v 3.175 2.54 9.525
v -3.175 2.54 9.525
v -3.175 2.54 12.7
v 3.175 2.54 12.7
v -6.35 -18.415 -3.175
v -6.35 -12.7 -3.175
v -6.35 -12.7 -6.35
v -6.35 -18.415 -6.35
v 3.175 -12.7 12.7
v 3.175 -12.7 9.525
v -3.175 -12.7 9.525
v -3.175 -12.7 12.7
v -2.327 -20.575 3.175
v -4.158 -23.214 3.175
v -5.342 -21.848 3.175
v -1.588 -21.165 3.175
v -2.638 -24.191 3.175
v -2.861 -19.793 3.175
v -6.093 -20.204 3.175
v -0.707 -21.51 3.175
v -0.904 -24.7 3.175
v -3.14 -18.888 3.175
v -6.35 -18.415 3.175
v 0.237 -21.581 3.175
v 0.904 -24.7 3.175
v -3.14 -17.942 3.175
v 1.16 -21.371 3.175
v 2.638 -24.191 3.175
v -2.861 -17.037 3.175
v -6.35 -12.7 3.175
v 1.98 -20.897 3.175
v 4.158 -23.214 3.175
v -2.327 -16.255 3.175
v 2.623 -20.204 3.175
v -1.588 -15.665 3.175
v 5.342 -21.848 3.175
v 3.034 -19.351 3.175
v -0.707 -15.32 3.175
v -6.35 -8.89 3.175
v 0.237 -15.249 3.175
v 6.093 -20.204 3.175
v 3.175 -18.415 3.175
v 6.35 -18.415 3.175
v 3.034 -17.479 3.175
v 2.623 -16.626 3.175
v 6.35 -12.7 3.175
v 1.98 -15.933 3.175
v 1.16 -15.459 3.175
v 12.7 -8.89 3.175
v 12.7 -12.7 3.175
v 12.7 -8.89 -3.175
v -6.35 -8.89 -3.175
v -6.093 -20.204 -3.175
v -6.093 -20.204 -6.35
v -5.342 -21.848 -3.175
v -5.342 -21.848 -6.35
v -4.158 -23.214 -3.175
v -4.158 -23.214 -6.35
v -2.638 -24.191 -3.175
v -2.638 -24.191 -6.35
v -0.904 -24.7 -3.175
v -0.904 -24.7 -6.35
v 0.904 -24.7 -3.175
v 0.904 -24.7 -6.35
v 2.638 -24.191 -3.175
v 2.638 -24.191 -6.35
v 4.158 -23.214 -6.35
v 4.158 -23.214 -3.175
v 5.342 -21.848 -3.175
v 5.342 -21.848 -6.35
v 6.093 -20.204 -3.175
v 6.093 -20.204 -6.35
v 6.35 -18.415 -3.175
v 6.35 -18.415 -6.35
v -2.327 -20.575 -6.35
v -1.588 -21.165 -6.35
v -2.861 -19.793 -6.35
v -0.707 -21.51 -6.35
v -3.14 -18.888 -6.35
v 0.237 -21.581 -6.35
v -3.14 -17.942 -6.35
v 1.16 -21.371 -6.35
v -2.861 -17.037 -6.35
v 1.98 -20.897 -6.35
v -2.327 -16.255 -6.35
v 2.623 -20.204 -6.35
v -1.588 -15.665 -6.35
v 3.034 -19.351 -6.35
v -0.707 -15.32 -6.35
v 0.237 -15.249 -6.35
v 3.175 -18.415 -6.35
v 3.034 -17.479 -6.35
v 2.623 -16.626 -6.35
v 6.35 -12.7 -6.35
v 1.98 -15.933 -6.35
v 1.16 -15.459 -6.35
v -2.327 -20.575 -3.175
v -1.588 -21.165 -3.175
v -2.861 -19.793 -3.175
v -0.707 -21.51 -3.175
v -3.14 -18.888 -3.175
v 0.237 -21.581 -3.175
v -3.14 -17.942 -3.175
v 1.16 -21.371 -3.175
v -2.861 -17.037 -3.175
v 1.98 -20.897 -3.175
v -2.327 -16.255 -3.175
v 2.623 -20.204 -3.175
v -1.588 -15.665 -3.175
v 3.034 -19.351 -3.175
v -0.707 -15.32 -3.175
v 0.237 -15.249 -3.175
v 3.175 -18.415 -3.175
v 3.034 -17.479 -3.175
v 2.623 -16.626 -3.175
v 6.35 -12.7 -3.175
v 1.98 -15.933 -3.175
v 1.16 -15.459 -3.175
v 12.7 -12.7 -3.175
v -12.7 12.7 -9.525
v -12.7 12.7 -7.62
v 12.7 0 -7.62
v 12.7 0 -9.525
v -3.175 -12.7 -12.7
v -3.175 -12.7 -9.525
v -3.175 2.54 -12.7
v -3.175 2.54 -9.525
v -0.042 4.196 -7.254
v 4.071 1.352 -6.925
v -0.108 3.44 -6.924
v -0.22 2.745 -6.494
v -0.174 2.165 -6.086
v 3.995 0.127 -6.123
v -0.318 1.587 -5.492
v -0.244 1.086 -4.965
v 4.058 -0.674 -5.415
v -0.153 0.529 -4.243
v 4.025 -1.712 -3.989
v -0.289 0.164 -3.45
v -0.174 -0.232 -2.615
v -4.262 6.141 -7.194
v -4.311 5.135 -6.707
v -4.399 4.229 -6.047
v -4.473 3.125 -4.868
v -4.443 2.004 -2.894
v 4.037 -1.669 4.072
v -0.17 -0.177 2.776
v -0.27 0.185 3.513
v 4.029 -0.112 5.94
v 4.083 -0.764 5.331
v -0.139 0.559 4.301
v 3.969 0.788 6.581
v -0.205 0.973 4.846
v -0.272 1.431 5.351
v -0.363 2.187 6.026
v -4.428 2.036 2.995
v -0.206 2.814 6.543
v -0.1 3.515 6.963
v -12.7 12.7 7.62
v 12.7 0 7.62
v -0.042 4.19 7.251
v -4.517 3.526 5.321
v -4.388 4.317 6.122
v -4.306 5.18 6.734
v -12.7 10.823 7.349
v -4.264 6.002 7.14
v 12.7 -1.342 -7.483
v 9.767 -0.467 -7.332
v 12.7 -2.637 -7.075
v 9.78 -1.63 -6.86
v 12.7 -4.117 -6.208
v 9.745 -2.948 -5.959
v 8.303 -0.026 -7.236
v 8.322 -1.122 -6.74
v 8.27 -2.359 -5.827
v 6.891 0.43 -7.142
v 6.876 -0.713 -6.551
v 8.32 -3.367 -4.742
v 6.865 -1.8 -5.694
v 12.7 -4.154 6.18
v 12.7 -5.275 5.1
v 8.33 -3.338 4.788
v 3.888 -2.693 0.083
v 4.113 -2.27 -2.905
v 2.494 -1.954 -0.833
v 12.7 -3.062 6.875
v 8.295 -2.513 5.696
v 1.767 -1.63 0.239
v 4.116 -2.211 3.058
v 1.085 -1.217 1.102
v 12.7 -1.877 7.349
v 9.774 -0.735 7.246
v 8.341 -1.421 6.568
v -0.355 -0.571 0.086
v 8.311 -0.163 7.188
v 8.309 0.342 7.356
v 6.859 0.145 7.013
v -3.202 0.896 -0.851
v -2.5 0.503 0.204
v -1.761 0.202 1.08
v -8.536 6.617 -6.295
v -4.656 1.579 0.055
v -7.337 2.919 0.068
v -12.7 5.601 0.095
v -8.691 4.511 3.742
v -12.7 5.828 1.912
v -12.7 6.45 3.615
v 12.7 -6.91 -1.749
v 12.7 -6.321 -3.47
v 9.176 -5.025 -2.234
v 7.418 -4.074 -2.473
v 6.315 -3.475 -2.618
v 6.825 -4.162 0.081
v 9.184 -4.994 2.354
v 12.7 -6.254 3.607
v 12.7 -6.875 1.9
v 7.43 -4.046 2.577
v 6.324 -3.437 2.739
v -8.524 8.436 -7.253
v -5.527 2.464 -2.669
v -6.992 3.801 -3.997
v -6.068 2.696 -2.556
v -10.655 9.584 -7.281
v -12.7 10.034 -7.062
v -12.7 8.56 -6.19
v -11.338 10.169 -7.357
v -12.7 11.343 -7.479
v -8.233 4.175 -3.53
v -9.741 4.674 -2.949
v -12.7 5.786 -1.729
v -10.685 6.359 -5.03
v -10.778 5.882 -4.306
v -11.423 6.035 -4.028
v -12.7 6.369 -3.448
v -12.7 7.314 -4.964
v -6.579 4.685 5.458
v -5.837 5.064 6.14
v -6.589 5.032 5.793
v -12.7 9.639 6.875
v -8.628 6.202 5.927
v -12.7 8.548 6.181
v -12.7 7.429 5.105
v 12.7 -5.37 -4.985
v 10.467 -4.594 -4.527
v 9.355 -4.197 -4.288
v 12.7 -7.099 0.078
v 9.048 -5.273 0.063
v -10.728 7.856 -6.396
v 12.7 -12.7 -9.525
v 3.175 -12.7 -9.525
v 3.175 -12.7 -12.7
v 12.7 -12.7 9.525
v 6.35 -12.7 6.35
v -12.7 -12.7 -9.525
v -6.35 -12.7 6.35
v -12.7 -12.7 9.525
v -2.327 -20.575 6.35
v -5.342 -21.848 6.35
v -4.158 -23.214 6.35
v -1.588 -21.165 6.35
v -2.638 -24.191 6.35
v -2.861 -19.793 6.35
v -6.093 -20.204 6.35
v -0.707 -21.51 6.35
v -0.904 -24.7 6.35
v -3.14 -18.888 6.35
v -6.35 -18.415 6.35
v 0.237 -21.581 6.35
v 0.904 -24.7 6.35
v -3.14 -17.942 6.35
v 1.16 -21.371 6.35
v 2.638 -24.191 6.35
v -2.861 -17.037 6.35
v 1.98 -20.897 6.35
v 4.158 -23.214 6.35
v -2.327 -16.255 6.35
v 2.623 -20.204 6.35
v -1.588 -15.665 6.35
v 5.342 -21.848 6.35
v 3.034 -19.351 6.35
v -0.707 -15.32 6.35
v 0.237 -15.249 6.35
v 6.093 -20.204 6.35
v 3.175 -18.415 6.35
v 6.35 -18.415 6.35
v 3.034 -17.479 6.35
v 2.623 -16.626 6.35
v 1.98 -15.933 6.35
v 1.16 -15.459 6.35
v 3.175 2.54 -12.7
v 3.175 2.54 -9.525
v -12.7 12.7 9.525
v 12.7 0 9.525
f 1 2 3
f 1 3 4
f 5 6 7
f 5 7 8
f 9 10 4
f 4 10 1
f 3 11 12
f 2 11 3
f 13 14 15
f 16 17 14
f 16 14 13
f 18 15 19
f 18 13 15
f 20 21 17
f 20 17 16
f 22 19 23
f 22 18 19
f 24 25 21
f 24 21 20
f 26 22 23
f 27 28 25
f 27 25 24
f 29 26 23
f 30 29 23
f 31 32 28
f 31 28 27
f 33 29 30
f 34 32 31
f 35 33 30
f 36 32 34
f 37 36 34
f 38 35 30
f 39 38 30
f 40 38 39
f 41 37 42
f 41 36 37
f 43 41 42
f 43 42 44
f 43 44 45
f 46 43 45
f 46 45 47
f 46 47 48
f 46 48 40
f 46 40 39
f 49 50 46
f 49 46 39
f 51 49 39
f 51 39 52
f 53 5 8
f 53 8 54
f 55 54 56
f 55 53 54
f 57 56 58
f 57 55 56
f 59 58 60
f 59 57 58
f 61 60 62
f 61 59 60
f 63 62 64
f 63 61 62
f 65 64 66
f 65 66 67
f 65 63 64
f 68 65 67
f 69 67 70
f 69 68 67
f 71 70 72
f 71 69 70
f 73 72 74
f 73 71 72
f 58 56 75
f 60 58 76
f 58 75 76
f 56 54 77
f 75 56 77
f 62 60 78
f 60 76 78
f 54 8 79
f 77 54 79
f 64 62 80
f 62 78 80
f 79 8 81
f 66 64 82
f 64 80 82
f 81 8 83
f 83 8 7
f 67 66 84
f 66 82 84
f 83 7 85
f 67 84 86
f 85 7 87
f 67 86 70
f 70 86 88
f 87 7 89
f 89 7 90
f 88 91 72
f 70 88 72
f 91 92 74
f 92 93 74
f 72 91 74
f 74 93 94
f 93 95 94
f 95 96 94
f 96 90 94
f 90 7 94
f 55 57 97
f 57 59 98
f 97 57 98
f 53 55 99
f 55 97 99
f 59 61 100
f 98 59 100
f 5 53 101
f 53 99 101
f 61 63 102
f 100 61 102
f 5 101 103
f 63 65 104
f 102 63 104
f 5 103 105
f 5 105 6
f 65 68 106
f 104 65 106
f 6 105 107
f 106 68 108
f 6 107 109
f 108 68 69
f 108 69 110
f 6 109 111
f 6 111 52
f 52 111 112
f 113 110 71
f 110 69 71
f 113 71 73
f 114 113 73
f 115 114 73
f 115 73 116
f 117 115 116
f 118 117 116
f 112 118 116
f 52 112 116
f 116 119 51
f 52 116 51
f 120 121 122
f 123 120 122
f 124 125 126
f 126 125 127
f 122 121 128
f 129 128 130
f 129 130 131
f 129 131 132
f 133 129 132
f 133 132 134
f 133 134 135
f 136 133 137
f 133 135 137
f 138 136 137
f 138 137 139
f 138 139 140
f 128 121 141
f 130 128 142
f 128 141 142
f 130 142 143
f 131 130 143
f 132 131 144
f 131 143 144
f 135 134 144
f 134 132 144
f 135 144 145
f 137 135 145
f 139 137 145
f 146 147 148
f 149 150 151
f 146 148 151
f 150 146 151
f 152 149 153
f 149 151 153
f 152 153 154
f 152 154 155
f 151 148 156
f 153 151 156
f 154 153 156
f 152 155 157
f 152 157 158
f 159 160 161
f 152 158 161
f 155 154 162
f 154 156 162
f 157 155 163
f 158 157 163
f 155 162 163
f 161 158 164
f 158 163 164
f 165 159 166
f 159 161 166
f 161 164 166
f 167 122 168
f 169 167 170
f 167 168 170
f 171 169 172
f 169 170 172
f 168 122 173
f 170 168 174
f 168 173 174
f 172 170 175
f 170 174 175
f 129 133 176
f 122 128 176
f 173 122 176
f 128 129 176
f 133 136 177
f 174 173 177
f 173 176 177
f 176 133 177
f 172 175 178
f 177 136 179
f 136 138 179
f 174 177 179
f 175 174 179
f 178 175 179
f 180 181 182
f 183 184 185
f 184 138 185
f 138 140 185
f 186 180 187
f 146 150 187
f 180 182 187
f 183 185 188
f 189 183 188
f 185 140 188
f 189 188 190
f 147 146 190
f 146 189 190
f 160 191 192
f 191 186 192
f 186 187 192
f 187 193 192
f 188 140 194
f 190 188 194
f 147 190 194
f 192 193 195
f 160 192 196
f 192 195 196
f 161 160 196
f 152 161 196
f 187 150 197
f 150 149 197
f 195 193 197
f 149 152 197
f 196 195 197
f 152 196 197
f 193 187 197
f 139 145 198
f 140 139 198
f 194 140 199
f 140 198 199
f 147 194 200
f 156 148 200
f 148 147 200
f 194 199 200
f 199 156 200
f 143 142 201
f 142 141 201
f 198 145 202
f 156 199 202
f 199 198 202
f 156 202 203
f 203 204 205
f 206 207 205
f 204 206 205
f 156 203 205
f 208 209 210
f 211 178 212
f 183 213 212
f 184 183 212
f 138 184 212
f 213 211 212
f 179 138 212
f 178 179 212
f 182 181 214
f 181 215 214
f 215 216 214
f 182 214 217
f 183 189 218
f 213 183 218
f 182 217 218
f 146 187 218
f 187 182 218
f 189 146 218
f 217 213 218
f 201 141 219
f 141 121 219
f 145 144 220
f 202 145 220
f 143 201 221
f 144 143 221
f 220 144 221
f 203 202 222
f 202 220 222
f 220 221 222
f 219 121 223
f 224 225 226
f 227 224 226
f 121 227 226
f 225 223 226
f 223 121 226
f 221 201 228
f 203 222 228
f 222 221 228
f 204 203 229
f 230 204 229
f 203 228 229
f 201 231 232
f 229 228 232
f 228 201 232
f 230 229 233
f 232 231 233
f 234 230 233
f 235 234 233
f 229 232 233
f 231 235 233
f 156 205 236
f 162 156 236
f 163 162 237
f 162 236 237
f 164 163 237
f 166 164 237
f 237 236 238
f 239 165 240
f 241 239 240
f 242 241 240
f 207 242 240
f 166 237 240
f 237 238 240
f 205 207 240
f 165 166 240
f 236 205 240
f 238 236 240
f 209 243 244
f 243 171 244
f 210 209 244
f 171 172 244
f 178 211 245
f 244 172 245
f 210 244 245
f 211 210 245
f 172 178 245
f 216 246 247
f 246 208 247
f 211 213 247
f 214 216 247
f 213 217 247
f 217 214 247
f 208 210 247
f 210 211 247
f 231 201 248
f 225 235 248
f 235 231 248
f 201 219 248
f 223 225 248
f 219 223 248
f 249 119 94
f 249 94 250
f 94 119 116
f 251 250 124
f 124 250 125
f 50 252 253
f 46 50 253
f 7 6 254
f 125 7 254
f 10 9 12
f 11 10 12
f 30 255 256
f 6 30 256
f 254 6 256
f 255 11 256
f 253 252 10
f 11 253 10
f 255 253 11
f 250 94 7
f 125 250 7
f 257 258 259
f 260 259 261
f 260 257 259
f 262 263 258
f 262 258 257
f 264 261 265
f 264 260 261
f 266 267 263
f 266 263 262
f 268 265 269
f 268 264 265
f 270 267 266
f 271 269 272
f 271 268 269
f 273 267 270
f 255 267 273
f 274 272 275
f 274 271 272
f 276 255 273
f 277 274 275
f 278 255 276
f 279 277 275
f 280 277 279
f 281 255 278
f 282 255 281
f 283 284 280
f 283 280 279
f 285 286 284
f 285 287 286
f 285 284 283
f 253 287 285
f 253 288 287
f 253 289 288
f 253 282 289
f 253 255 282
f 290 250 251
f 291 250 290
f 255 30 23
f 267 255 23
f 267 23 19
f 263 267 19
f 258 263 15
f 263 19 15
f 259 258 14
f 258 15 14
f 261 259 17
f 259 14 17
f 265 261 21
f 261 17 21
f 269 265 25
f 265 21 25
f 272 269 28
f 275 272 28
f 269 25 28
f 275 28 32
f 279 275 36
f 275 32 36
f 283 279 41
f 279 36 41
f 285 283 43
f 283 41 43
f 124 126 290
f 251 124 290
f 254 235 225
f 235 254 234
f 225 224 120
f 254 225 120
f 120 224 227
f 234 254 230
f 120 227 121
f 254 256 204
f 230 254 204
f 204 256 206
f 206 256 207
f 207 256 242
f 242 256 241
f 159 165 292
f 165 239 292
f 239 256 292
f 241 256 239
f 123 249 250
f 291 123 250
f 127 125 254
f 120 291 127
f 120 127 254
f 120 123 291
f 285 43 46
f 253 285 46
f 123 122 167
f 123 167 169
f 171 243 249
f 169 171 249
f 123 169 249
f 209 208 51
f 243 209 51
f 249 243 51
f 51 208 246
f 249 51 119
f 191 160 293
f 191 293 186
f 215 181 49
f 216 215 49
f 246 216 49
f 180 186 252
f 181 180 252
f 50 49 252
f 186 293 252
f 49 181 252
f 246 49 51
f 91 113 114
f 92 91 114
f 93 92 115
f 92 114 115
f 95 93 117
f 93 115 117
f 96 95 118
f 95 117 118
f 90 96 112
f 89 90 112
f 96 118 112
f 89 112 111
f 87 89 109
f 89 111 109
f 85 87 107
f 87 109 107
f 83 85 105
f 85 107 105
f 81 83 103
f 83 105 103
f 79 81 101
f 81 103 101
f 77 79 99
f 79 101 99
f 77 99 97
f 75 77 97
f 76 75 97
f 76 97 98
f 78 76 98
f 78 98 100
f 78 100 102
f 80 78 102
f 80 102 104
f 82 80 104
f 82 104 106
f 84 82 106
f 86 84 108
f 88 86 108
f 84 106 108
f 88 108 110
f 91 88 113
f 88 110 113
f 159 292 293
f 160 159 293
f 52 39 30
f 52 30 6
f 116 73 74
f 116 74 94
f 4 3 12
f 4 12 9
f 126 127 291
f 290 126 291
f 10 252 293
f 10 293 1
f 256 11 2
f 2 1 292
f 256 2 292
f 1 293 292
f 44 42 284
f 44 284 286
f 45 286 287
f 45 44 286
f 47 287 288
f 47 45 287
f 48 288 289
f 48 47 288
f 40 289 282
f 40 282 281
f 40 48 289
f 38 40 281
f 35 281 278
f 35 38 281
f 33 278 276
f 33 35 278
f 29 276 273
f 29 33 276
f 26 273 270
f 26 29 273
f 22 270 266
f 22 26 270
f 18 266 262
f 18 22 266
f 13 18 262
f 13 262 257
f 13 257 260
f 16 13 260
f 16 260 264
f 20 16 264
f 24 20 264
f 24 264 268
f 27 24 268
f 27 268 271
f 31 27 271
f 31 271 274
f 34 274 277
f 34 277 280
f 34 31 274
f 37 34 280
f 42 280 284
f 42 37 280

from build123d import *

# Parameters (mm, degrees)
BOSS_EXTRUDE1_DEPTH = 9.525
SKETCH3_RX          = 7.62
SKETCH3_RY          = 6.35
CUT_EXTRUDE1_DEPTH  = 35.077675977
SKETCH4_W           = 6.35
SKETCH4_H           = 15.24
BOSS_EXTRUDE2_DEPTH = 3.175
SKETCH5_R           = 3.175
BOSS_EXTRUDE3_DEPTH = 3.175
SKETCH6_W           = 6.35
SKETCH6_H           = 3.81
CUT_EXTRUDE2_DEPTH  = 19.05


with BuildPart() as part:
    # Sketch1 → Boss-Extrude1 (new body, symmetric)
    with BuildSketch(Plane.XY):
        Polygon((-12.7, 12.7), (12.7, 0), (12.7, -12.7), (-12.7, -12.7), align=None)
    extrude(amount=BOSS_EXTRUDE1_DEPTH, both=True)

    # Sketch3 → Cut-Extrude1 (cut, through all)
    with BuildSketch(Plane(origin=(-15.24, 7.62, 0), x_dir=(0, 0, -1), z_dir=(-0.894427191, 0.447213595, 0))):
        with Locations(Location((0, -5.679612663), (0, 0, 0))):
            Ellipse(SKETCH3_RX, SKETCH3_RY)
    extrude(amount=-CUT_EXTRUDE1_DEPTH, mode=Mode.SUBTRACT)

    # Sketch4 → Boss-Extrude2 (add)
    with BuildSketch(Plane.XY.offset(9.525)):
        with Locations((0, -5.08)):
            Rectangle(SKETCH4_W, SKETCH4_H)
    boss_extrude2 = extrude(amount=BOSS_EXTRUDE2_DEPTH)

    # Sketch5 → Boss-Extrude3 (add)
    with BuildSketch(Plane.XY.offset(3.175)):
        with BuildLine():
            Line((-6.35, -12.7), (-6.35, -18.415))
            ThreePointArc((-6.35, -18.415), (0, -24.765), (6.35, -18.415))
            Line((6.35, -18.415), (6.35, -12.7))
            Line((6.35, -12.7), (-6.35, -12.7))
        make_face()
        with Locations((0, -18.415)):
            Circle(SKETCH5_R, mode=Mode.SUBTRACT)
    boss_extrude3 = extrude(amount=BOSS_EXTRUDE3_DEPTH)

    # Mirror1: Boss-Extrude2, Boss-Extrude3 across plane
    add(boss_extrude2.mirror(Plane.XY))
    add(boss_extrude3.mirror(Plane.XY))

    # Sketch6 → Cut-Extrude2 (cut)
    with BuildSketch(Plane(origin=(12.7, 0, 0), x_dir=(0, 0, -1), z_dir=(1, 0, 0))):
        with Locations((0, -10.795)):
            Rectangle(SKETCH6_W, SKETCH6_H)
    extrude(amount=-CUT_EXTRUDE2_DEPTH, mode=Mode.SUBTRACT)


solid = part.part
